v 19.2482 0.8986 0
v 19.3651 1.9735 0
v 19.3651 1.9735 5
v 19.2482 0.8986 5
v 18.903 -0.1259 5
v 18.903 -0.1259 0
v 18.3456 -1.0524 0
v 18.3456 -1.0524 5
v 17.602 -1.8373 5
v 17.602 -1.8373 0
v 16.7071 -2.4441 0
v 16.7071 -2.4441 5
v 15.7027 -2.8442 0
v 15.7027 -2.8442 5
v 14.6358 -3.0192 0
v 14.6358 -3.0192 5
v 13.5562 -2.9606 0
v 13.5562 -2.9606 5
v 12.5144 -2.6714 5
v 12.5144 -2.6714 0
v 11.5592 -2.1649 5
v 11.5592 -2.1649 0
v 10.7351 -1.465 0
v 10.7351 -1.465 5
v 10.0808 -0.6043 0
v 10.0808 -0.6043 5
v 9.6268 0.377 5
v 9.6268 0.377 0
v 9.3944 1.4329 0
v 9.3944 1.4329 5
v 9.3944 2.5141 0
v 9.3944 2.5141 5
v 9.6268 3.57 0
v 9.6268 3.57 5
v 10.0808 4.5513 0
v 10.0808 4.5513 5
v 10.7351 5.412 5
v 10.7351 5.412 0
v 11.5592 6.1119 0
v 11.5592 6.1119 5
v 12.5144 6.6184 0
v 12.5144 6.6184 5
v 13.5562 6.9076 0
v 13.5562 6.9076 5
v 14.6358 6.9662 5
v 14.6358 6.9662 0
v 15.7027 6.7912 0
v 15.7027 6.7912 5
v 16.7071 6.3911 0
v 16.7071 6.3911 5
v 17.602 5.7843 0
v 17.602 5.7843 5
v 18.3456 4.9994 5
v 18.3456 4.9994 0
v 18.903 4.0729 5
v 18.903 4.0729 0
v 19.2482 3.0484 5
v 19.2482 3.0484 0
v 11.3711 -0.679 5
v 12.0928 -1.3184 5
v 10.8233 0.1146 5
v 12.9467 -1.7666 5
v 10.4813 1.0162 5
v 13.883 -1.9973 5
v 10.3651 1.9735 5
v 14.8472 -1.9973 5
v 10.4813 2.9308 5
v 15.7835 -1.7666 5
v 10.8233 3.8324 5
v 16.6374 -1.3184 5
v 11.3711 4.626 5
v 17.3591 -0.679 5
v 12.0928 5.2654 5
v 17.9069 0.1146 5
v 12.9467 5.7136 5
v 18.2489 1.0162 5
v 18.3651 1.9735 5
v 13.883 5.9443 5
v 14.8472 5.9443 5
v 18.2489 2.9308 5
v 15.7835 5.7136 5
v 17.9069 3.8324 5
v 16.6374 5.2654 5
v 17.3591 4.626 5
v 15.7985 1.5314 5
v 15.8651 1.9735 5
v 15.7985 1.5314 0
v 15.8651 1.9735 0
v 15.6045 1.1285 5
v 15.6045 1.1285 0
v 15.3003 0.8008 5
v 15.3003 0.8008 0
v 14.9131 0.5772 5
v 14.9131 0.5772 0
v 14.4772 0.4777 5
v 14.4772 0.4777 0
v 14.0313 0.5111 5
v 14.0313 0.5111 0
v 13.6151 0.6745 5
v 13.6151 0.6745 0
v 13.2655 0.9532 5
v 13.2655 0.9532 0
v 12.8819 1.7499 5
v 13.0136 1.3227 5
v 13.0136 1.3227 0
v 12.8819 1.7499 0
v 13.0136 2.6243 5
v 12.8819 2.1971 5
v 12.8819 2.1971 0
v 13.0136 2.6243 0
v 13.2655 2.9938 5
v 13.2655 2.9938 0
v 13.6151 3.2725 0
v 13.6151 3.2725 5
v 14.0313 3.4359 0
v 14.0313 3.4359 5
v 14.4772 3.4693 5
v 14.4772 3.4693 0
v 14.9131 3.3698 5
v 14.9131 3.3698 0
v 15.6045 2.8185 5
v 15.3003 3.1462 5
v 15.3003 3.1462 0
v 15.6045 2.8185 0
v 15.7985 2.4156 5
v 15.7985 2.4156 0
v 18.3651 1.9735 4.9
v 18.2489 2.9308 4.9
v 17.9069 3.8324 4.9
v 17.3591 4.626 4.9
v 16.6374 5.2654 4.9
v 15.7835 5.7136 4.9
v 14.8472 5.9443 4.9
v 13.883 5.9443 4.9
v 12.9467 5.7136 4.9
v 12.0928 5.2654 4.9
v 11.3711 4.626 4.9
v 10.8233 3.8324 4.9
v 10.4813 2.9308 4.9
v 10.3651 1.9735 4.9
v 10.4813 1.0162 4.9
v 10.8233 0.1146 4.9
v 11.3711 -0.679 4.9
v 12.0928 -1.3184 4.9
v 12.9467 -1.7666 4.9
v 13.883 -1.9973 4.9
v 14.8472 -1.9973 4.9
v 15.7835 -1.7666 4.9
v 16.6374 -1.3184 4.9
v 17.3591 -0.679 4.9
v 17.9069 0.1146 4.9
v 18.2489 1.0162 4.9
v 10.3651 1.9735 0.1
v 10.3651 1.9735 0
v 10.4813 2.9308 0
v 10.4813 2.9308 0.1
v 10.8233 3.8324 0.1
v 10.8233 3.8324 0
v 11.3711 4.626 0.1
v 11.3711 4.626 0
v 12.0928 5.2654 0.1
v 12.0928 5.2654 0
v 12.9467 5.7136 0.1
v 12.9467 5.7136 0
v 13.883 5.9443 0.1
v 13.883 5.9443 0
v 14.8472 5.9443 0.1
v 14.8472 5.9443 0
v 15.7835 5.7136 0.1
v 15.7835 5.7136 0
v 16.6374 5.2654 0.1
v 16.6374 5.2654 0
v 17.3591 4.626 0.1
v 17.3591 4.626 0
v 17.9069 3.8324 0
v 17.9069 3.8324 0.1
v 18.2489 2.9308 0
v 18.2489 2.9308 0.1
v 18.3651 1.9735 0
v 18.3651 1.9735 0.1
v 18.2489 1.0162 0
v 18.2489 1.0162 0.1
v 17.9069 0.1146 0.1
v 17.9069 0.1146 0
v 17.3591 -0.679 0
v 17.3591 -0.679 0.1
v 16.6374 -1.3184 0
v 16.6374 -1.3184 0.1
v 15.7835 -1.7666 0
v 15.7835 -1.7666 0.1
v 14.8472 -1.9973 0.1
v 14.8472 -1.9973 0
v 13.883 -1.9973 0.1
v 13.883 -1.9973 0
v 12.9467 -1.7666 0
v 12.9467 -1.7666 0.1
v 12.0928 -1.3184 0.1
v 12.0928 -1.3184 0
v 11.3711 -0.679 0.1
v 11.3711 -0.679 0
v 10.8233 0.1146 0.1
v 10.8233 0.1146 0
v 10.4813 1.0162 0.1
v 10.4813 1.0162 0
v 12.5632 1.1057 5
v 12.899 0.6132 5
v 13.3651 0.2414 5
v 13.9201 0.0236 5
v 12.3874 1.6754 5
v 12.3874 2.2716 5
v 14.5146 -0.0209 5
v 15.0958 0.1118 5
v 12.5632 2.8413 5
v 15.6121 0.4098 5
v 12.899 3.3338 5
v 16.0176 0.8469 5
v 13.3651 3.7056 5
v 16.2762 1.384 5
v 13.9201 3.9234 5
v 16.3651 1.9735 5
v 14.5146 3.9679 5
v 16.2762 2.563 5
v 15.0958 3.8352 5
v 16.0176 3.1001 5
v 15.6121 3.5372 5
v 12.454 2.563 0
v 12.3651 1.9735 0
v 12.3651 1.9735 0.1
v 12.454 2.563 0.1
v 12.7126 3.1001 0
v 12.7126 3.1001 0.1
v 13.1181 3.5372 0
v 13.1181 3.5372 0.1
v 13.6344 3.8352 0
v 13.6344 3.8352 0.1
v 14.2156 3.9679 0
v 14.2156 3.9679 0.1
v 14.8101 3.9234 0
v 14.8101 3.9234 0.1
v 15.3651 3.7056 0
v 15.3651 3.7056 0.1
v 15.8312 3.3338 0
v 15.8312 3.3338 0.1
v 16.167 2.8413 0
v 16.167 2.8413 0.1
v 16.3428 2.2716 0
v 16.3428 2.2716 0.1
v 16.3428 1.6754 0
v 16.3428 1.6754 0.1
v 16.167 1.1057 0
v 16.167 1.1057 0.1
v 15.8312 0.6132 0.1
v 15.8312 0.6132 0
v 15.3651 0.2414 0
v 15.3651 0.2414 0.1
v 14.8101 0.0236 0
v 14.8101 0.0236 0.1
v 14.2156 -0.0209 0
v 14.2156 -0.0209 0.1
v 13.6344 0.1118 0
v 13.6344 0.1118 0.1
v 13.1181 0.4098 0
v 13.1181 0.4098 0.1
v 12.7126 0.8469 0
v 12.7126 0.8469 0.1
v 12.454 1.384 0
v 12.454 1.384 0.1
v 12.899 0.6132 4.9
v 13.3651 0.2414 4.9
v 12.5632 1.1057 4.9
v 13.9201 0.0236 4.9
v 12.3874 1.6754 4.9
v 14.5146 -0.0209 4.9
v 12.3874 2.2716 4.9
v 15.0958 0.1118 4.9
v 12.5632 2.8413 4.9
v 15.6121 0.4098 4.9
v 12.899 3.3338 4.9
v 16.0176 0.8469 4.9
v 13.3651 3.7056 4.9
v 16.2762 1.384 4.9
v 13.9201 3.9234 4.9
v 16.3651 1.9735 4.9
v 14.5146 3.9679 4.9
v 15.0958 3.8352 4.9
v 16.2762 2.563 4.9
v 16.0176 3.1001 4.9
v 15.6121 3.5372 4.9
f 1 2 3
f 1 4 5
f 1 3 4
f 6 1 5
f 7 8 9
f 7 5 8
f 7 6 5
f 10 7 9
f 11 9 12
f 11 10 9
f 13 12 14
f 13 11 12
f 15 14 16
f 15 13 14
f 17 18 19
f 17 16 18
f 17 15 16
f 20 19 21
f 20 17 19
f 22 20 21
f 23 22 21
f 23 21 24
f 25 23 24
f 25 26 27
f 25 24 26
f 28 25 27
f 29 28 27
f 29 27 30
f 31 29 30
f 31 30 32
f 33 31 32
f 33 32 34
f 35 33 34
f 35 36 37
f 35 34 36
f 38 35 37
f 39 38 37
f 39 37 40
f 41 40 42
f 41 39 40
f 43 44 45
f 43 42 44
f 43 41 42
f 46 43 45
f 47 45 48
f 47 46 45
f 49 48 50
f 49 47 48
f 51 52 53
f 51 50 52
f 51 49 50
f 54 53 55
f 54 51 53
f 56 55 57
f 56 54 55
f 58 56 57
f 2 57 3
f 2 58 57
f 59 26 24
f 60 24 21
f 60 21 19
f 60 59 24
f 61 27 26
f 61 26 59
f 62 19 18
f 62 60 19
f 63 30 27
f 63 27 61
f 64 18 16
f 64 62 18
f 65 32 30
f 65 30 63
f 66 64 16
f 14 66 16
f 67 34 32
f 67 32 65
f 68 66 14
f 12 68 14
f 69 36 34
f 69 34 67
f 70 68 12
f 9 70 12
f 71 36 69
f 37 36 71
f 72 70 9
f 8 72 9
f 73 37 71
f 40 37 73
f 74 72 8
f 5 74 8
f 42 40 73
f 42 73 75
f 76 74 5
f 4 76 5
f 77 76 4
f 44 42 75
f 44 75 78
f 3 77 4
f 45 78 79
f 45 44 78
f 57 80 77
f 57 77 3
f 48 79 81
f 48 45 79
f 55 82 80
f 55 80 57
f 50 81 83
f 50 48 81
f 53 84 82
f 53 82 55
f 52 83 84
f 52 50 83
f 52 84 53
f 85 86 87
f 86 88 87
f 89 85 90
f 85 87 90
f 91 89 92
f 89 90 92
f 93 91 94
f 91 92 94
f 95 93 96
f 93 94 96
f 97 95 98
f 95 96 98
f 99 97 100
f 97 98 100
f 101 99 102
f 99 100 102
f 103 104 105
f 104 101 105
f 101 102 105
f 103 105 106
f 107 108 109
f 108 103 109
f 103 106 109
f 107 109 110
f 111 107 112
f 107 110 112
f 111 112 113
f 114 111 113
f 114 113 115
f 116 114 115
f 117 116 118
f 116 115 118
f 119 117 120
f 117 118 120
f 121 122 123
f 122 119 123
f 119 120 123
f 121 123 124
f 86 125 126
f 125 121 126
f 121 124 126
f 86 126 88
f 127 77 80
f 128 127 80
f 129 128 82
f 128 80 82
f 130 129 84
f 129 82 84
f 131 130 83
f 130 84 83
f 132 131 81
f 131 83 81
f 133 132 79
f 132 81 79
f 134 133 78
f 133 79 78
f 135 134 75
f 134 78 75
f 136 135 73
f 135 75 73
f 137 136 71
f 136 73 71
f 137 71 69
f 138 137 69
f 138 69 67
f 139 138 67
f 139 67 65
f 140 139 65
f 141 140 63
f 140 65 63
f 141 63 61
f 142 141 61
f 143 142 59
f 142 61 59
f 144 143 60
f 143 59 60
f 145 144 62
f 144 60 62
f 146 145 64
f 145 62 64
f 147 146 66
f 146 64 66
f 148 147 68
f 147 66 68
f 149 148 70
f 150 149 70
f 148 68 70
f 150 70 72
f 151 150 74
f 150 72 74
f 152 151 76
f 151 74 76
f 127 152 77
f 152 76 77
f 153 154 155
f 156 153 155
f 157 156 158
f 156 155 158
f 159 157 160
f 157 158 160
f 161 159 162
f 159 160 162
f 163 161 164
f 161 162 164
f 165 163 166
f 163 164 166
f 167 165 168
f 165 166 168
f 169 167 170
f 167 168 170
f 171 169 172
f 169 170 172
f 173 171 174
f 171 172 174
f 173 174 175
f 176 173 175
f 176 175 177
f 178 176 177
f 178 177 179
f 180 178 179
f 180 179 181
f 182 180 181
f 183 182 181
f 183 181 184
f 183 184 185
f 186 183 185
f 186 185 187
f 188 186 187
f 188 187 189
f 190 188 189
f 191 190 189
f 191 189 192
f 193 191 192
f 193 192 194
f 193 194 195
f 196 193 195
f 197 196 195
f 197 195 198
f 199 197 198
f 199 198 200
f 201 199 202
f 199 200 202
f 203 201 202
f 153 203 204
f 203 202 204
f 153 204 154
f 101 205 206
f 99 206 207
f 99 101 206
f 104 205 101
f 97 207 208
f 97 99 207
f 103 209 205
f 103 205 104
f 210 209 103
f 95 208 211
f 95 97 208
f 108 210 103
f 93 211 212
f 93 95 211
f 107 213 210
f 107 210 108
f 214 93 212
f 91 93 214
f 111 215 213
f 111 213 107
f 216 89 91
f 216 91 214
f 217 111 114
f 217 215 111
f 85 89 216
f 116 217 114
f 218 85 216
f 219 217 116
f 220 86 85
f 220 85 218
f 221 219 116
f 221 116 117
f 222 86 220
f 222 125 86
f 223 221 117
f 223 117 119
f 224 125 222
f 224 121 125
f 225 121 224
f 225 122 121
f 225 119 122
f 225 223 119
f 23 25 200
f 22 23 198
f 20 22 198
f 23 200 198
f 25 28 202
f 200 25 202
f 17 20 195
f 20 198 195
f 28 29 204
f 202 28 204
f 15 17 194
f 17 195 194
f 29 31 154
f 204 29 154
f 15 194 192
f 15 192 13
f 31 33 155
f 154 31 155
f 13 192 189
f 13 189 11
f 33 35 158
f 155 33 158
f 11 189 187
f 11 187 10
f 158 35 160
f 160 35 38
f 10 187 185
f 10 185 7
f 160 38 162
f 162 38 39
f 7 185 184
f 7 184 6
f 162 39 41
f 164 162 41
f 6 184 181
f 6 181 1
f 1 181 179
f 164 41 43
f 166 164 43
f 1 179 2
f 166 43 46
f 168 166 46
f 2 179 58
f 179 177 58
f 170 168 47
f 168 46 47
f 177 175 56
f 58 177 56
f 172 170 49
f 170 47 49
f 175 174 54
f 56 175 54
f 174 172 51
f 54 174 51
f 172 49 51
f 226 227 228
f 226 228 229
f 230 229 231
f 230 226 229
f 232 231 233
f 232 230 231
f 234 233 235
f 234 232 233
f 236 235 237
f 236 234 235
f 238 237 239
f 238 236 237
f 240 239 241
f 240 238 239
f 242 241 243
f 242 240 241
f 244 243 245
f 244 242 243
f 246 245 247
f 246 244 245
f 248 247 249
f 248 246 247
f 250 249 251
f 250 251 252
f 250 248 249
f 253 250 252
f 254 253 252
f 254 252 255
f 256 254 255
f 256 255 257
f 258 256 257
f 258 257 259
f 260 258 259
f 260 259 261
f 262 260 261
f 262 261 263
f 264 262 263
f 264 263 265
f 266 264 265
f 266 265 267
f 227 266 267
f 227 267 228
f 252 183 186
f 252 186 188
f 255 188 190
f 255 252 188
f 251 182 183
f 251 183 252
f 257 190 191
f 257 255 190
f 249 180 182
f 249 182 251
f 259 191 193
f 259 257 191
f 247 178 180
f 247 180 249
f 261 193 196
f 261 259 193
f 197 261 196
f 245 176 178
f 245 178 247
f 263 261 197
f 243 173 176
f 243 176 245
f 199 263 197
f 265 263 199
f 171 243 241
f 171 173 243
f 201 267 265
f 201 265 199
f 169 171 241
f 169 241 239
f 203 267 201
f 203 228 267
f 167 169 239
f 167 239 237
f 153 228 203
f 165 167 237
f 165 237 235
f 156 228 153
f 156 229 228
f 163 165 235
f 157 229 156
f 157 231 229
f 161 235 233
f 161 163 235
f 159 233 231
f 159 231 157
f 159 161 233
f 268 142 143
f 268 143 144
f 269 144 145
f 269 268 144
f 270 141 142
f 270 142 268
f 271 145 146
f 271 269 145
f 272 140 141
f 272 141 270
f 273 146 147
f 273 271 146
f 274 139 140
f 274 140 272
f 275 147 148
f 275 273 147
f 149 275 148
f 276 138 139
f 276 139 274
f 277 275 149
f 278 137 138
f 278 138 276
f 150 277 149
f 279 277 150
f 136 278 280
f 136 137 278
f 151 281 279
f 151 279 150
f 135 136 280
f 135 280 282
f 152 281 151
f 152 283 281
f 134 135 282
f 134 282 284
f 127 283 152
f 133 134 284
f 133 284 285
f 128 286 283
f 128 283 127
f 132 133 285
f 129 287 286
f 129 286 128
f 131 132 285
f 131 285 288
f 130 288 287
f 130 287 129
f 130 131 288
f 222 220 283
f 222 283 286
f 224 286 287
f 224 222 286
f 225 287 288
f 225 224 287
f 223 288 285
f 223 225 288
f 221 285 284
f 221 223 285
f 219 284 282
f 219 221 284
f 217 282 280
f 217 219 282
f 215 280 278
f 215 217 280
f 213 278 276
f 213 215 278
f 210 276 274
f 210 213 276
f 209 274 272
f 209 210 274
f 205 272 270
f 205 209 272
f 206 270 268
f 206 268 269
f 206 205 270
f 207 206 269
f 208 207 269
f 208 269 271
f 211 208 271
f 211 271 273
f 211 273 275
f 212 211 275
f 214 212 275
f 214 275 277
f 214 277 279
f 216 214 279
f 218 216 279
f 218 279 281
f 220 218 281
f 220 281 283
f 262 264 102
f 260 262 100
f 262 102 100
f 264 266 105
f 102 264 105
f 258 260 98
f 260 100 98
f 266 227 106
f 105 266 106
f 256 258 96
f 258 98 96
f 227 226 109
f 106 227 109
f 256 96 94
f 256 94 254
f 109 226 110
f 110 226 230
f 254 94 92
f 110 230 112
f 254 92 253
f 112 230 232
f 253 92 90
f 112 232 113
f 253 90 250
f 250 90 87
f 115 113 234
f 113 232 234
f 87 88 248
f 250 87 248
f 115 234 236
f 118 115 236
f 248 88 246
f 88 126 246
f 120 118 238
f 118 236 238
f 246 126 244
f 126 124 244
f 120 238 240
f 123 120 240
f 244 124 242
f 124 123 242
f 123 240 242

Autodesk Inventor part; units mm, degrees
ref_plane "YZ Plane" through (0, 0, 0) normal (1, 0, 0) x (0, 1, 0)
ref_plane "XZ Plane" through (0, 0, 0) normal (0, 1, 0) x (-1, 0, 0)
ref_plane "XY Plane" through (0, 0, 0) normal (0, 0, 1) x (1, 0, 0)
sketch "Sketch1" plane through (0, 0, 0) normal (0, 0, 1) x (1, 0, 0)
  circle A0 centre (14.3651, 1.9735) radius 1.5 projected
  circle A1 centre (14.3651, 1.9735) radius 5
  circle A2 centre (14.3651, 1.9735) radius 1.5
  point P0 (0, 0)
  dimension "d0" = 10
  dimension "d1" = 3
extrude "Extrusion1" add sketch "Sketch1" along normal blind 5
sketch "Sketch2" plane through (14.3651, 1.9735, 5) normal (0, 0, 1) x (1, 0, 0)
  circle A0 centre (0, 0) radius 5 projected
  circle A1 centre (0, 0) radius 1.5 projected
  circle A2 centre (0, 0) radius 2
  circle A3 centre (0, 0) radius 4
  point P0 (-14.3651, -1.9735)
  dimension "d4" = 4
  dimension "d5" = 8
extrude "Extrusion2" cut sketch "Sketch2" against normal blind 0.1 contours A3
sketch "Sketch3" plane through (14.3651, 1.9735, 0) normal (0, 0, -1) x (-1, 0, 0)
  circle A0 centre (0, 0) radius 4 projected
  circle A1 centre (0, 0) radius 2 projected
  point P0 (14.3651, -1.9735)
extrude "Extrusion3" cut sketch "Sketch3" against normal blind 0.1
properties part number "bearing_3_10_5"
